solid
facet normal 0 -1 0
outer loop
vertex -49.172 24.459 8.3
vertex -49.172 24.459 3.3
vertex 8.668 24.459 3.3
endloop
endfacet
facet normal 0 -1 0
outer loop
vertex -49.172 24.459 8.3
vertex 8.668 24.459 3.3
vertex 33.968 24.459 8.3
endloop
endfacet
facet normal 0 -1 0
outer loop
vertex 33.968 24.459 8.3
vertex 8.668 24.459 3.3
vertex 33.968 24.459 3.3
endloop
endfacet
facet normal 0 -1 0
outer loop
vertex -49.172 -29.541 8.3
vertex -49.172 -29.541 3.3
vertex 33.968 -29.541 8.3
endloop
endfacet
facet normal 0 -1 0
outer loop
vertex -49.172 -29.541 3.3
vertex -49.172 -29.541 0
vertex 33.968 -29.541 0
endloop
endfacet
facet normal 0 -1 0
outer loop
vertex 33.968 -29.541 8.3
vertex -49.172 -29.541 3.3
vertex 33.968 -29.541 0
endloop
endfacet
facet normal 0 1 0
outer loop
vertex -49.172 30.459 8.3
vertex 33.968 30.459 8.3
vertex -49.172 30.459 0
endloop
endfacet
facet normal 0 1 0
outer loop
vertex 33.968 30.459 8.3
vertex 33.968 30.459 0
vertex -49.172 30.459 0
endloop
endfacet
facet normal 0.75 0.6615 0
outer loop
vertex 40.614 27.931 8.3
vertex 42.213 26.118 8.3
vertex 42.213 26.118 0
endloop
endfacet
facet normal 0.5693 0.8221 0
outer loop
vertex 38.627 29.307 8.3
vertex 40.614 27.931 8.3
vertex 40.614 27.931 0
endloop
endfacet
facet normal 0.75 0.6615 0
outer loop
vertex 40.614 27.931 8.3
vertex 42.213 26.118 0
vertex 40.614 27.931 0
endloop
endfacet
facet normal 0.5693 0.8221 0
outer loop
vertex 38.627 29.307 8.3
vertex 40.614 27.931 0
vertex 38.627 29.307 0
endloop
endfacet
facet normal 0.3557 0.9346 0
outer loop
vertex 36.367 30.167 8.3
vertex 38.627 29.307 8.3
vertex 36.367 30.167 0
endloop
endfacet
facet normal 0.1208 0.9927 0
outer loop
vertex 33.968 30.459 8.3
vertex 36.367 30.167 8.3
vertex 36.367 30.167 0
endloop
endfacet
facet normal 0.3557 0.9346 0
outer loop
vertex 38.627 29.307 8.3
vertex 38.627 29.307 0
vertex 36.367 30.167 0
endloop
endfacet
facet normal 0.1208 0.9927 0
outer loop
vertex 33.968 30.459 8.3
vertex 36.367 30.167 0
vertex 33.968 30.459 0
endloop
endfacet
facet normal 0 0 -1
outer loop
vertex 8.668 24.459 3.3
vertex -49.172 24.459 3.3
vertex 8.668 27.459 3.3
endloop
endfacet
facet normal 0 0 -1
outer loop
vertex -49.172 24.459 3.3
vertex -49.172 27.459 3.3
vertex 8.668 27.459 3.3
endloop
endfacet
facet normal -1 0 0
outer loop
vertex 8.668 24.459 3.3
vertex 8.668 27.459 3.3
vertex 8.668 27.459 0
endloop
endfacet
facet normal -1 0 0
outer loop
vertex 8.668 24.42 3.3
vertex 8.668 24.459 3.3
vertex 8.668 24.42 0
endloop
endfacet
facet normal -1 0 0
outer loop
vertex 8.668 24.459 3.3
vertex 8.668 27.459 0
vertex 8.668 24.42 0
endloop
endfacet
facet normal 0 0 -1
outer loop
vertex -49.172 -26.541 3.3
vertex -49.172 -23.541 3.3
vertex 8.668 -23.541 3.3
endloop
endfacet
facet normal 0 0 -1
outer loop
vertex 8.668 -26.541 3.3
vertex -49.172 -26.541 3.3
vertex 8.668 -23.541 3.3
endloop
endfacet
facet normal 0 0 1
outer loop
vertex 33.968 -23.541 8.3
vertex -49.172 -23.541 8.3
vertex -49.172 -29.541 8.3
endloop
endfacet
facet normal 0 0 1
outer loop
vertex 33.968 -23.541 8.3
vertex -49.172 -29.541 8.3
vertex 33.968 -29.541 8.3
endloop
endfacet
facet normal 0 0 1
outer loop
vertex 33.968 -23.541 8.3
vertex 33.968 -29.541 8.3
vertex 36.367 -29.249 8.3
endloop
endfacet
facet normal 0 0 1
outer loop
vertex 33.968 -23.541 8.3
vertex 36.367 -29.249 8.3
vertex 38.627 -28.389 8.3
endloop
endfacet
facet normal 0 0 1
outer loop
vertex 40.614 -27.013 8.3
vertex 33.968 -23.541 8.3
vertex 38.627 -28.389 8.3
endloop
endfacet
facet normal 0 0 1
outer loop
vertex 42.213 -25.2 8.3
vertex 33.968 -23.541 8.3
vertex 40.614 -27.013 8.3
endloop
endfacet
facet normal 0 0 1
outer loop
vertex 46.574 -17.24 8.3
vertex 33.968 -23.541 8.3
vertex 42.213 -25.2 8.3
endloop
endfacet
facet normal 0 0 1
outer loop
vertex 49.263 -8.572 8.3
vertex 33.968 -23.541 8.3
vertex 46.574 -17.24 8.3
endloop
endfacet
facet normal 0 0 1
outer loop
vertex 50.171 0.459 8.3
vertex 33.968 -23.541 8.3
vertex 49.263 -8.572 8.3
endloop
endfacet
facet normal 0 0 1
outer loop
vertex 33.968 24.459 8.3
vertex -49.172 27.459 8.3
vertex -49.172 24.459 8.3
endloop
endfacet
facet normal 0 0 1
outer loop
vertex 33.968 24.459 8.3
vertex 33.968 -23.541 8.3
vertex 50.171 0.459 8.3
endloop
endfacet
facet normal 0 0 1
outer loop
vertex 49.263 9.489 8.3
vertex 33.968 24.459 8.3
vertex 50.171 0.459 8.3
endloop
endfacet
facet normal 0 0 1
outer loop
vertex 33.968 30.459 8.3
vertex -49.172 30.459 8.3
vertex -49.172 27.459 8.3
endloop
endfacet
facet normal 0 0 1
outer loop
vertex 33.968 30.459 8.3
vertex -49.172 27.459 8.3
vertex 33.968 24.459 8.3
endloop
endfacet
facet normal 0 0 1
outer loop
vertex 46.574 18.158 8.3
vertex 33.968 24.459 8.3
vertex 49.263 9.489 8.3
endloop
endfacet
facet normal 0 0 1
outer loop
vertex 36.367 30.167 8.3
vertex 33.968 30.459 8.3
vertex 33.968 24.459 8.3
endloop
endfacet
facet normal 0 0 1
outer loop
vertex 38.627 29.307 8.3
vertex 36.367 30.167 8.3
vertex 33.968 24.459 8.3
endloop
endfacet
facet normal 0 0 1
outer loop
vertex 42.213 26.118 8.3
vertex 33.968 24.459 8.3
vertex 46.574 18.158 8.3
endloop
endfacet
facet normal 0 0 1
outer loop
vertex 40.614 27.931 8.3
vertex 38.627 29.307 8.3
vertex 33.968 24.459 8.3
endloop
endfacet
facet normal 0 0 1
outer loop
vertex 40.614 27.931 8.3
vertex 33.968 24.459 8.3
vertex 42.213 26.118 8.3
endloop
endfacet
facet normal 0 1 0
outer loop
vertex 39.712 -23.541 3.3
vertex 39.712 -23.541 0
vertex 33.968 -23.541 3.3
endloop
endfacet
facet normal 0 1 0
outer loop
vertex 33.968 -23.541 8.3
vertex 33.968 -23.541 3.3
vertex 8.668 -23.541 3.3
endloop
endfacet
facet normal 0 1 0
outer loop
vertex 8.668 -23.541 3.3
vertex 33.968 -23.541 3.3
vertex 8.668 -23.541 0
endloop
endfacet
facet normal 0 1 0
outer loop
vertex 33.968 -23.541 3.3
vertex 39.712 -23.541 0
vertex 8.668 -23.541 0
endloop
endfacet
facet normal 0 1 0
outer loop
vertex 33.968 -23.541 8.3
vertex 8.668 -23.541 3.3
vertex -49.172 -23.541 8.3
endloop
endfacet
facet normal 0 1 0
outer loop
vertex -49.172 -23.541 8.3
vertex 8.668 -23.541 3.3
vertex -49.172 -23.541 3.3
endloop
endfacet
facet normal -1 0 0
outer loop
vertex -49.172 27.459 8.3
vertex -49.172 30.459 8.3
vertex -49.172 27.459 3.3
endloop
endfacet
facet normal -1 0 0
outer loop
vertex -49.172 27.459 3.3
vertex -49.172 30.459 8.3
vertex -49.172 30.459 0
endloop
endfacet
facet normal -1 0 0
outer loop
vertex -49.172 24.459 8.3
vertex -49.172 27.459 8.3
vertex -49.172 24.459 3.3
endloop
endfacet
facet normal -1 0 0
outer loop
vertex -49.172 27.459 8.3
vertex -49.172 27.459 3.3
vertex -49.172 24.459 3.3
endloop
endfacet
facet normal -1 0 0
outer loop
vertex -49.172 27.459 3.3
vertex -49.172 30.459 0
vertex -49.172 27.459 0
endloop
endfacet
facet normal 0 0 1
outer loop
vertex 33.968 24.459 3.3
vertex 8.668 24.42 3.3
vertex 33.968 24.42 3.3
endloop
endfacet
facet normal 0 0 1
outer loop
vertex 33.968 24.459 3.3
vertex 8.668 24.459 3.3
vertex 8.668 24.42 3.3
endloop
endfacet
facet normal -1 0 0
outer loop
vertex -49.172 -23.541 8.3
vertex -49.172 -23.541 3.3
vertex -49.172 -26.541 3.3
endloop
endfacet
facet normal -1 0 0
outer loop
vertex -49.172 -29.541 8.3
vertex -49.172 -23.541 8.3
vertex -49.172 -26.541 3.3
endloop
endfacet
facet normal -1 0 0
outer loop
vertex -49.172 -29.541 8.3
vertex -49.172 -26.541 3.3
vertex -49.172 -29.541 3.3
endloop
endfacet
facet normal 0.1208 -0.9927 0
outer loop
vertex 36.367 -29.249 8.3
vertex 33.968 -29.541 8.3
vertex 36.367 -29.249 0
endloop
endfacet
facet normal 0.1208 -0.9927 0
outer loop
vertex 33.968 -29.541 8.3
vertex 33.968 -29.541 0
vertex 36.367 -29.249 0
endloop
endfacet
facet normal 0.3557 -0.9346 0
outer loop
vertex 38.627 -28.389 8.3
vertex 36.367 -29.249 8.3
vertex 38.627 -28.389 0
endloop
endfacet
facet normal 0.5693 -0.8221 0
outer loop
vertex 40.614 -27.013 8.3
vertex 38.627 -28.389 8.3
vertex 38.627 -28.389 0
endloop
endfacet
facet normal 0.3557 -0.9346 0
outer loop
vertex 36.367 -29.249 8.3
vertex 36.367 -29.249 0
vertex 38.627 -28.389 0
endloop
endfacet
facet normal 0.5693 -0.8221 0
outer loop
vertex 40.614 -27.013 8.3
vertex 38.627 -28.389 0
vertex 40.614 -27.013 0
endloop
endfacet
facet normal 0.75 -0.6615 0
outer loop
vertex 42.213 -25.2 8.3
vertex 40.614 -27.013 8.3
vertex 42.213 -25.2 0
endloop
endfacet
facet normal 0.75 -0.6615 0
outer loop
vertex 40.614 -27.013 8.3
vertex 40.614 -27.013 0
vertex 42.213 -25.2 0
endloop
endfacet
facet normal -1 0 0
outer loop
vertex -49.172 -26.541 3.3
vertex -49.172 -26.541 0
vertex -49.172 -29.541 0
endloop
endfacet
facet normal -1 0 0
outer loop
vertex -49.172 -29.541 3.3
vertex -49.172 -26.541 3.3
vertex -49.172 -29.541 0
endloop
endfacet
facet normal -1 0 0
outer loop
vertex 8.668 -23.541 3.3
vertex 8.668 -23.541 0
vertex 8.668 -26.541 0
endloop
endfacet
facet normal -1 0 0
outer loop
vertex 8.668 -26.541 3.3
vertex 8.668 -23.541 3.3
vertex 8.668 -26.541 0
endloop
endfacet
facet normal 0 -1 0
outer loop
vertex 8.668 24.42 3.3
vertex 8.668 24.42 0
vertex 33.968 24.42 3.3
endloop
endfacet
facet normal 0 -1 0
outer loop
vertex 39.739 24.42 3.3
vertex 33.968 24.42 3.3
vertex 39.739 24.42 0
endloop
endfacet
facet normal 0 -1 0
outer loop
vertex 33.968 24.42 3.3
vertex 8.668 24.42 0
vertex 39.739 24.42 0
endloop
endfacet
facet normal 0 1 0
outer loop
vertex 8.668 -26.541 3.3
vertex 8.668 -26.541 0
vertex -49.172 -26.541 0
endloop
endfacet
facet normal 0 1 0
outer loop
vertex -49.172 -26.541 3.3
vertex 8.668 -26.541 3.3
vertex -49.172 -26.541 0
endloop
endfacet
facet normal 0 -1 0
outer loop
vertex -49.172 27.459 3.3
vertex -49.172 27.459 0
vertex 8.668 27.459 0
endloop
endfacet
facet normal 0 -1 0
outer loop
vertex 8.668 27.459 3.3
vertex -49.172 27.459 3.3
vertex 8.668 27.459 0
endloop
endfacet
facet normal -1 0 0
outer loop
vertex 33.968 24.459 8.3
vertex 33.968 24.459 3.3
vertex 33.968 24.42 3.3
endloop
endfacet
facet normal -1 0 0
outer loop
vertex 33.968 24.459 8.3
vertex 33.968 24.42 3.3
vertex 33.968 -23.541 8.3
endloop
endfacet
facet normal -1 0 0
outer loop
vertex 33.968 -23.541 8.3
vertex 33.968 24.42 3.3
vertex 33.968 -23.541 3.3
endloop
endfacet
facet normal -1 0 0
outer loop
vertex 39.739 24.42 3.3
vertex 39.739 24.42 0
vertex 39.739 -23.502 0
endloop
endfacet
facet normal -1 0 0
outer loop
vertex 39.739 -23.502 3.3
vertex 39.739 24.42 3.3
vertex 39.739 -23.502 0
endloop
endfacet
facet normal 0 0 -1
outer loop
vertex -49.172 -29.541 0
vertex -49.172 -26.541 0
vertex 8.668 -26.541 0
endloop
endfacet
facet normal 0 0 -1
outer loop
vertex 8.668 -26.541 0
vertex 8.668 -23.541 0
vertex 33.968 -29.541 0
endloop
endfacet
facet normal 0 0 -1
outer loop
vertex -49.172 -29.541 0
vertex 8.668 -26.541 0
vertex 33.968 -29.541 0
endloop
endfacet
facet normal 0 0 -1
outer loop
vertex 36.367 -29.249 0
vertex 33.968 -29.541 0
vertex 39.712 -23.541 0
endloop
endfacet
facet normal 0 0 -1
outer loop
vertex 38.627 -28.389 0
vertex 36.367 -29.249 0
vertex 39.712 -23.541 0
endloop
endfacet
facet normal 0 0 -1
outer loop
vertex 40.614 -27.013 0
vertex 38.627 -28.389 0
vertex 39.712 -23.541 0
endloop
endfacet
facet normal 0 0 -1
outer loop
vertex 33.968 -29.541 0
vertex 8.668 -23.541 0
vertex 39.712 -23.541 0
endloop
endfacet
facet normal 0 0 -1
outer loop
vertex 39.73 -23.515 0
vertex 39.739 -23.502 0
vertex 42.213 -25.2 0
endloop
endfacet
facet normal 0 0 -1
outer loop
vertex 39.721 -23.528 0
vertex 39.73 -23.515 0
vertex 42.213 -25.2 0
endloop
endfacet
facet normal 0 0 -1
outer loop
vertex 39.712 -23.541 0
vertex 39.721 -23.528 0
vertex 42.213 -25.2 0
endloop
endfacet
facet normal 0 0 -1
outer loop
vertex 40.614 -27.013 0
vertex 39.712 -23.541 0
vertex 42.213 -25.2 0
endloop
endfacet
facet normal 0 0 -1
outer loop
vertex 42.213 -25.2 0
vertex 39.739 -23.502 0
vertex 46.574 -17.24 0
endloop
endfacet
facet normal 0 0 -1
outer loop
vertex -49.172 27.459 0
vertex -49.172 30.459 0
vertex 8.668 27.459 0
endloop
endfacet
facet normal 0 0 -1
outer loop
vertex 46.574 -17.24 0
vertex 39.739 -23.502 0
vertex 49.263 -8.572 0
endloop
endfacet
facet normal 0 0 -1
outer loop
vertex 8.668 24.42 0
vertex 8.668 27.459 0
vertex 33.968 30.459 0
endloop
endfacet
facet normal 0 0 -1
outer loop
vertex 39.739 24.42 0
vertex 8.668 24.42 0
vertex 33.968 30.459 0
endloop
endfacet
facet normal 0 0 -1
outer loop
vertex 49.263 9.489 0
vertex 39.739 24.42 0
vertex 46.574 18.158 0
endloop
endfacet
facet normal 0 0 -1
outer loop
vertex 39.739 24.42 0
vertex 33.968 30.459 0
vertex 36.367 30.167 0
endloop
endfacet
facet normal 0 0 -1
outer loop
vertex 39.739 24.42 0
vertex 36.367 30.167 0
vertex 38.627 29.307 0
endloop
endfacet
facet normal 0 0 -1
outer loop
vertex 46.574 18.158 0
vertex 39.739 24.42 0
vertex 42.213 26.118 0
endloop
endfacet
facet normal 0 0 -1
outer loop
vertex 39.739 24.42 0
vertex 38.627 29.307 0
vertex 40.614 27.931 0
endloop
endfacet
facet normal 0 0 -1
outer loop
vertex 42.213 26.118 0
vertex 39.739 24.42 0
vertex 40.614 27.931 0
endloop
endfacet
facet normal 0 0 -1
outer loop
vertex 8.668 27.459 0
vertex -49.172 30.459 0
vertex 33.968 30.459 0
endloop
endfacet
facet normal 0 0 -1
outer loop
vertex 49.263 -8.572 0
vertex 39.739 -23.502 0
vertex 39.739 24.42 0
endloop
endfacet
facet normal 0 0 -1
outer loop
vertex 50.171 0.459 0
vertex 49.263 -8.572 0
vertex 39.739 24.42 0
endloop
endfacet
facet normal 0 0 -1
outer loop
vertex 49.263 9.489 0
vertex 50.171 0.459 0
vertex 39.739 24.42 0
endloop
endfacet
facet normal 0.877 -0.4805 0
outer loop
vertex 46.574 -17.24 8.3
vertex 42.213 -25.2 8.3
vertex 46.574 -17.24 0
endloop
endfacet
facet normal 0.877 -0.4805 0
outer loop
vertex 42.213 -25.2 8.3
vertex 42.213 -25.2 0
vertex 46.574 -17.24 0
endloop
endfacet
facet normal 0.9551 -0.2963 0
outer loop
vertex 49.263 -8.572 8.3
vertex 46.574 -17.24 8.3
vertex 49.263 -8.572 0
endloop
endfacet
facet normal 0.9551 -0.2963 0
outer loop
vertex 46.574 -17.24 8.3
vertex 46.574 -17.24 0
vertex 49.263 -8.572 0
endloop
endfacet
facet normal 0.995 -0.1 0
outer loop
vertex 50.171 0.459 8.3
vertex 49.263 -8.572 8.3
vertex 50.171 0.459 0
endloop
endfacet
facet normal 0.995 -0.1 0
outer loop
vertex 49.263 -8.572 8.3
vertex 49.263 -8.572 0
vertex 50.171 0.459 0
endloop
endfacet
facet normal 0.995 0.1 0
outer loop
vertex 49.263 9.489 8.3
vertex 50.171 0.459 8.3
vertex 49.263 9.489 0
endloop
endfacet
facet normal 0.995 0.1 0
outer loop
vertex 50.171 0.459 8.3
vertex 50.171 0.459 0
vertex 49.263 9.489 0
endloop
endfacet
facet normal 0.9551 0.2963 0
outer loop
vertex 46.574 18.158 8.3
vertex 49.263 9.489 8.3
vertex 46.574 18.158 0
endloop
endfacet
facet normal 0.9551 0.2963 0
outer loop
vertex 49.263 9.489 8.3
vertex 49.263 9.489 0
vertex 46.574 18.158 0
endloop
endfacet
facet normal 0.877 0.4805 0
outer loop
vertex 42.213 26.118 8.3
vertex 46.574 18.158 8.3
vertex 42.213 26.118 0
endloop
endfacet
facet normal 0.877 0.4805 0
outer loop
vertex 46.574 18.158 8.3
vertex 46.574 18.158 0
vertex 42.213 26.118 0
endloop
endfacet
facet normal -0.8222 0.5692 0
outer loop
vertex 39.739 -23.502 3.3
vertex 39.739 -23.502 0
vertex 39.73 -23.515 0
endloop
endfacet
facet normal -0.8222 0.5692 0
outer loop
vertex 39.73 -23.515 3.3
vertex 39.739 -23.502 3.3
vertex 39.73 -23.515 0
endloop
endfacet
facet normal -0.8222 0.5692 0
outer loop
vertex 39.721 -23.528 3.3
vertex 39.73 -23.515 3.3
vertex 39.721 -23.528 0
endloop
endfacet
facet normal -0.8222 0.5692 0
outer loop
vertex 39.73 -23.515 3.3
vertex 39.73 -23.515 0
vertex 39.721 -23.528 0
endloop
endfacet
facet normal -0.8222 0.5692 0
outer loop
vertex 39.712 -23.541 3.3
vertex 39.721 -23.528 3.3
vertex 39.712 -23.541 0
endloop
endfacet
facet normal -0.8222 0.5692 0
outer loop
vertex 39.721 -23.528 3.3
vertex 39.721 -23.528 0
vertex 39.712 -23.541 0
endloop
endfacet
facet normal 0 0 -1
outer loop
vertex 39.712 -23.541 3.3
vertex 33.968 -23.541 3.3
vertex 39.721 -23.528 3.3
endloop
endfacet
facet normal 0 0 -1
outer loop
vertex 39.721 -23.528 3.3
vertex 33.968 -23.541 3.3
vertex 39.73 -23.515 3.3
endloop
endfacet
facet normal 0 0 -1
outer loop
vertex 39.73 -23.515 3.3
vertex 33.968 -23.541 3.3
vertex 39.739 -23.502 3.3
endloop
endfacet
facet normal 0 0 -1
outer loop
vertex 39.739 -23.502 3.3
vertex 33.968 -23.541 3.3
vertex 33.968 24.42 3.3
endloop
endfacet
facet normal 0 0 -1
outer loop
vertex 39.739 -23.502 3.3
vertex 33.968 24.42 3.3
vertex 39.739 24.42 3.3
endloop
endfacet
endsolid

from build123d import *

# Parameters (mm, degrees)
EXTRUDE_1_DEPTH = 3.3
SKETCH_2_W      = 57.839960125
SKETCH_2_H      = 3
EXTRUDE_2_DEPTH = 5


with BuildPart() as part:
    # 草图1 → 凸台-拉伸1 (new body)
    with BuildSketch(Plane.XY):
        with BuildLine():
            Line((-49.172249904, -26.54104015), (-49.172249904, -29.54104015))
            Line((-49.172249904, -29.54104015), (33.967710221, -29.54104015))
            ThreePointArc((33.967710221, -29.54104015), (38.626676103, -28.38943192), (42.212581294, -25.199847532))
            ThreePointArc((42.212581294, -25.199847532), (50.170886291, 0.45895985), (42.212581294, 26.117767232))
            ThreePointArc((42.212581294, 26.117767232), (38.626676103, 29.307351619), (33.967710221, 30.45895985))
            Line((33.967710221, 30.45895985), (-49.172249904, 30.45895985))
            Line((-49.172249904, 30.45895985), (-49.172249904, 27.45895985))
            Line((-49.172249904, 27.45895985), (8.667710221, 27.45895985))
            Line((8.667710221, 27.45895985), (8.667710221, 24.420125017))
            Line((8.667710221, 24.420125017), (39.739119972, 24.420125017))
            Line((39.739119972, 24.420125017), (39.739119972, -23.502205318))
            ThreePointArc((39.739119972, -23.502205318), (39.72572916, -23.521645368), (39.712272868, -23.54104015))
            Line((39.712272868, -23.54104015), (8.667710221, -23.54104015))
            Line((8.667710221, -23.54104015), (8.667710221, -26.54104015))
            Line((8.667710221, -26.54104015), (-49.172249904, -26.54104015))
        make_face()
    extrude(amount=EXTRUDE_1_DEPTH)

    # 草图2 → 凸台-拉伸2 (add)
    with BuildSketch(Plane.XY.offset(3.3)):
        with Locations((-20.252269842, -25.04104015)):
            Rectangle(SKETCH_2_W, SKETCH_2_H)
        with BuildLine():
            Line((39.739119972, 24.420125017), (33.967710221, 24.420125017))
            Line((33.967710221, 24.420125017), (33.967710221, -23.54104015))
            Line((33.967710221, -23.54104015), (39.712272868, -23.54104015))
            ThreePointArc((39.712272868, -23.54104015), (39.72572916, -23.521645368), (39.739119972, -23.502205318))
            Line((39.739119972, -23.502205318), (39.739119972, 24.420125017))
        make_face()
        with BuildLine():
            Line((-49.172249904, 30.45895985), (-49.172249904, 27.45895985))
            Line((-49.172249904, 27.45895985), (8.667710221, 27.45895985))
            Line((8.667710221, 27.45895985), (8.667710221, 24.45895985))
            Line((8.667710221, 24.45895985), (33.967710221, 24.45895985))
            Line((33.967710221, 24.45895985), (33.967710221, 24.420125017))
            Line((33.967710221, 24.420125017), (39.739119972, 24.420125017))
            Line((39.739119972, 24.420125017), (39.739119972, -23.502205318))
            ThreePointArc((39.739119972, -23.502205318), (39.72572916, -23.521645368), (39.712272868, -23.54104015))
            Line((39.712272868, -23.54104015), (33.967710221, -23.54104015))
            Line((33.967710221, -23.54104015), (8.667710221, -23.54104015))
            Line((8.667710221, -23.54104015), (8.667710221, -26.54104015))
            Line((8.667710221, -26.54104015), (-49.172249904, -26.54104015))
            Line((-49.172249904, -26.54104015), (-49.172249904, -29.54104015))
            Line((-49.172249904, -29.54104015), (33.967710221, -29.54104015))
            ThreePointArc((33.967710221, -29.54104015), (38.626676103, -28.38943192), (42.212581294, -25.199847532))
            ThreePointArc((42.212581294, -25.199847532), (50.170886291, 0.45895985), (42.212581294, 26.117767232))
            ThreePointArc((42.212581294, 26.117767232), (38.626676103, 29.307351619), (33.967710221, 30.45895985))
            Line((33.967710221, 30.45895985), (-49.172249904, 30.45895985))
        make_face()
        with Locations((-20.252269842, 25.95895985)):
            Rectangle(SKETCH_2_W, SKETCH_2_H)
    extrude(amount=EXTRUDE_2_DEPTH)


solid = part.part
